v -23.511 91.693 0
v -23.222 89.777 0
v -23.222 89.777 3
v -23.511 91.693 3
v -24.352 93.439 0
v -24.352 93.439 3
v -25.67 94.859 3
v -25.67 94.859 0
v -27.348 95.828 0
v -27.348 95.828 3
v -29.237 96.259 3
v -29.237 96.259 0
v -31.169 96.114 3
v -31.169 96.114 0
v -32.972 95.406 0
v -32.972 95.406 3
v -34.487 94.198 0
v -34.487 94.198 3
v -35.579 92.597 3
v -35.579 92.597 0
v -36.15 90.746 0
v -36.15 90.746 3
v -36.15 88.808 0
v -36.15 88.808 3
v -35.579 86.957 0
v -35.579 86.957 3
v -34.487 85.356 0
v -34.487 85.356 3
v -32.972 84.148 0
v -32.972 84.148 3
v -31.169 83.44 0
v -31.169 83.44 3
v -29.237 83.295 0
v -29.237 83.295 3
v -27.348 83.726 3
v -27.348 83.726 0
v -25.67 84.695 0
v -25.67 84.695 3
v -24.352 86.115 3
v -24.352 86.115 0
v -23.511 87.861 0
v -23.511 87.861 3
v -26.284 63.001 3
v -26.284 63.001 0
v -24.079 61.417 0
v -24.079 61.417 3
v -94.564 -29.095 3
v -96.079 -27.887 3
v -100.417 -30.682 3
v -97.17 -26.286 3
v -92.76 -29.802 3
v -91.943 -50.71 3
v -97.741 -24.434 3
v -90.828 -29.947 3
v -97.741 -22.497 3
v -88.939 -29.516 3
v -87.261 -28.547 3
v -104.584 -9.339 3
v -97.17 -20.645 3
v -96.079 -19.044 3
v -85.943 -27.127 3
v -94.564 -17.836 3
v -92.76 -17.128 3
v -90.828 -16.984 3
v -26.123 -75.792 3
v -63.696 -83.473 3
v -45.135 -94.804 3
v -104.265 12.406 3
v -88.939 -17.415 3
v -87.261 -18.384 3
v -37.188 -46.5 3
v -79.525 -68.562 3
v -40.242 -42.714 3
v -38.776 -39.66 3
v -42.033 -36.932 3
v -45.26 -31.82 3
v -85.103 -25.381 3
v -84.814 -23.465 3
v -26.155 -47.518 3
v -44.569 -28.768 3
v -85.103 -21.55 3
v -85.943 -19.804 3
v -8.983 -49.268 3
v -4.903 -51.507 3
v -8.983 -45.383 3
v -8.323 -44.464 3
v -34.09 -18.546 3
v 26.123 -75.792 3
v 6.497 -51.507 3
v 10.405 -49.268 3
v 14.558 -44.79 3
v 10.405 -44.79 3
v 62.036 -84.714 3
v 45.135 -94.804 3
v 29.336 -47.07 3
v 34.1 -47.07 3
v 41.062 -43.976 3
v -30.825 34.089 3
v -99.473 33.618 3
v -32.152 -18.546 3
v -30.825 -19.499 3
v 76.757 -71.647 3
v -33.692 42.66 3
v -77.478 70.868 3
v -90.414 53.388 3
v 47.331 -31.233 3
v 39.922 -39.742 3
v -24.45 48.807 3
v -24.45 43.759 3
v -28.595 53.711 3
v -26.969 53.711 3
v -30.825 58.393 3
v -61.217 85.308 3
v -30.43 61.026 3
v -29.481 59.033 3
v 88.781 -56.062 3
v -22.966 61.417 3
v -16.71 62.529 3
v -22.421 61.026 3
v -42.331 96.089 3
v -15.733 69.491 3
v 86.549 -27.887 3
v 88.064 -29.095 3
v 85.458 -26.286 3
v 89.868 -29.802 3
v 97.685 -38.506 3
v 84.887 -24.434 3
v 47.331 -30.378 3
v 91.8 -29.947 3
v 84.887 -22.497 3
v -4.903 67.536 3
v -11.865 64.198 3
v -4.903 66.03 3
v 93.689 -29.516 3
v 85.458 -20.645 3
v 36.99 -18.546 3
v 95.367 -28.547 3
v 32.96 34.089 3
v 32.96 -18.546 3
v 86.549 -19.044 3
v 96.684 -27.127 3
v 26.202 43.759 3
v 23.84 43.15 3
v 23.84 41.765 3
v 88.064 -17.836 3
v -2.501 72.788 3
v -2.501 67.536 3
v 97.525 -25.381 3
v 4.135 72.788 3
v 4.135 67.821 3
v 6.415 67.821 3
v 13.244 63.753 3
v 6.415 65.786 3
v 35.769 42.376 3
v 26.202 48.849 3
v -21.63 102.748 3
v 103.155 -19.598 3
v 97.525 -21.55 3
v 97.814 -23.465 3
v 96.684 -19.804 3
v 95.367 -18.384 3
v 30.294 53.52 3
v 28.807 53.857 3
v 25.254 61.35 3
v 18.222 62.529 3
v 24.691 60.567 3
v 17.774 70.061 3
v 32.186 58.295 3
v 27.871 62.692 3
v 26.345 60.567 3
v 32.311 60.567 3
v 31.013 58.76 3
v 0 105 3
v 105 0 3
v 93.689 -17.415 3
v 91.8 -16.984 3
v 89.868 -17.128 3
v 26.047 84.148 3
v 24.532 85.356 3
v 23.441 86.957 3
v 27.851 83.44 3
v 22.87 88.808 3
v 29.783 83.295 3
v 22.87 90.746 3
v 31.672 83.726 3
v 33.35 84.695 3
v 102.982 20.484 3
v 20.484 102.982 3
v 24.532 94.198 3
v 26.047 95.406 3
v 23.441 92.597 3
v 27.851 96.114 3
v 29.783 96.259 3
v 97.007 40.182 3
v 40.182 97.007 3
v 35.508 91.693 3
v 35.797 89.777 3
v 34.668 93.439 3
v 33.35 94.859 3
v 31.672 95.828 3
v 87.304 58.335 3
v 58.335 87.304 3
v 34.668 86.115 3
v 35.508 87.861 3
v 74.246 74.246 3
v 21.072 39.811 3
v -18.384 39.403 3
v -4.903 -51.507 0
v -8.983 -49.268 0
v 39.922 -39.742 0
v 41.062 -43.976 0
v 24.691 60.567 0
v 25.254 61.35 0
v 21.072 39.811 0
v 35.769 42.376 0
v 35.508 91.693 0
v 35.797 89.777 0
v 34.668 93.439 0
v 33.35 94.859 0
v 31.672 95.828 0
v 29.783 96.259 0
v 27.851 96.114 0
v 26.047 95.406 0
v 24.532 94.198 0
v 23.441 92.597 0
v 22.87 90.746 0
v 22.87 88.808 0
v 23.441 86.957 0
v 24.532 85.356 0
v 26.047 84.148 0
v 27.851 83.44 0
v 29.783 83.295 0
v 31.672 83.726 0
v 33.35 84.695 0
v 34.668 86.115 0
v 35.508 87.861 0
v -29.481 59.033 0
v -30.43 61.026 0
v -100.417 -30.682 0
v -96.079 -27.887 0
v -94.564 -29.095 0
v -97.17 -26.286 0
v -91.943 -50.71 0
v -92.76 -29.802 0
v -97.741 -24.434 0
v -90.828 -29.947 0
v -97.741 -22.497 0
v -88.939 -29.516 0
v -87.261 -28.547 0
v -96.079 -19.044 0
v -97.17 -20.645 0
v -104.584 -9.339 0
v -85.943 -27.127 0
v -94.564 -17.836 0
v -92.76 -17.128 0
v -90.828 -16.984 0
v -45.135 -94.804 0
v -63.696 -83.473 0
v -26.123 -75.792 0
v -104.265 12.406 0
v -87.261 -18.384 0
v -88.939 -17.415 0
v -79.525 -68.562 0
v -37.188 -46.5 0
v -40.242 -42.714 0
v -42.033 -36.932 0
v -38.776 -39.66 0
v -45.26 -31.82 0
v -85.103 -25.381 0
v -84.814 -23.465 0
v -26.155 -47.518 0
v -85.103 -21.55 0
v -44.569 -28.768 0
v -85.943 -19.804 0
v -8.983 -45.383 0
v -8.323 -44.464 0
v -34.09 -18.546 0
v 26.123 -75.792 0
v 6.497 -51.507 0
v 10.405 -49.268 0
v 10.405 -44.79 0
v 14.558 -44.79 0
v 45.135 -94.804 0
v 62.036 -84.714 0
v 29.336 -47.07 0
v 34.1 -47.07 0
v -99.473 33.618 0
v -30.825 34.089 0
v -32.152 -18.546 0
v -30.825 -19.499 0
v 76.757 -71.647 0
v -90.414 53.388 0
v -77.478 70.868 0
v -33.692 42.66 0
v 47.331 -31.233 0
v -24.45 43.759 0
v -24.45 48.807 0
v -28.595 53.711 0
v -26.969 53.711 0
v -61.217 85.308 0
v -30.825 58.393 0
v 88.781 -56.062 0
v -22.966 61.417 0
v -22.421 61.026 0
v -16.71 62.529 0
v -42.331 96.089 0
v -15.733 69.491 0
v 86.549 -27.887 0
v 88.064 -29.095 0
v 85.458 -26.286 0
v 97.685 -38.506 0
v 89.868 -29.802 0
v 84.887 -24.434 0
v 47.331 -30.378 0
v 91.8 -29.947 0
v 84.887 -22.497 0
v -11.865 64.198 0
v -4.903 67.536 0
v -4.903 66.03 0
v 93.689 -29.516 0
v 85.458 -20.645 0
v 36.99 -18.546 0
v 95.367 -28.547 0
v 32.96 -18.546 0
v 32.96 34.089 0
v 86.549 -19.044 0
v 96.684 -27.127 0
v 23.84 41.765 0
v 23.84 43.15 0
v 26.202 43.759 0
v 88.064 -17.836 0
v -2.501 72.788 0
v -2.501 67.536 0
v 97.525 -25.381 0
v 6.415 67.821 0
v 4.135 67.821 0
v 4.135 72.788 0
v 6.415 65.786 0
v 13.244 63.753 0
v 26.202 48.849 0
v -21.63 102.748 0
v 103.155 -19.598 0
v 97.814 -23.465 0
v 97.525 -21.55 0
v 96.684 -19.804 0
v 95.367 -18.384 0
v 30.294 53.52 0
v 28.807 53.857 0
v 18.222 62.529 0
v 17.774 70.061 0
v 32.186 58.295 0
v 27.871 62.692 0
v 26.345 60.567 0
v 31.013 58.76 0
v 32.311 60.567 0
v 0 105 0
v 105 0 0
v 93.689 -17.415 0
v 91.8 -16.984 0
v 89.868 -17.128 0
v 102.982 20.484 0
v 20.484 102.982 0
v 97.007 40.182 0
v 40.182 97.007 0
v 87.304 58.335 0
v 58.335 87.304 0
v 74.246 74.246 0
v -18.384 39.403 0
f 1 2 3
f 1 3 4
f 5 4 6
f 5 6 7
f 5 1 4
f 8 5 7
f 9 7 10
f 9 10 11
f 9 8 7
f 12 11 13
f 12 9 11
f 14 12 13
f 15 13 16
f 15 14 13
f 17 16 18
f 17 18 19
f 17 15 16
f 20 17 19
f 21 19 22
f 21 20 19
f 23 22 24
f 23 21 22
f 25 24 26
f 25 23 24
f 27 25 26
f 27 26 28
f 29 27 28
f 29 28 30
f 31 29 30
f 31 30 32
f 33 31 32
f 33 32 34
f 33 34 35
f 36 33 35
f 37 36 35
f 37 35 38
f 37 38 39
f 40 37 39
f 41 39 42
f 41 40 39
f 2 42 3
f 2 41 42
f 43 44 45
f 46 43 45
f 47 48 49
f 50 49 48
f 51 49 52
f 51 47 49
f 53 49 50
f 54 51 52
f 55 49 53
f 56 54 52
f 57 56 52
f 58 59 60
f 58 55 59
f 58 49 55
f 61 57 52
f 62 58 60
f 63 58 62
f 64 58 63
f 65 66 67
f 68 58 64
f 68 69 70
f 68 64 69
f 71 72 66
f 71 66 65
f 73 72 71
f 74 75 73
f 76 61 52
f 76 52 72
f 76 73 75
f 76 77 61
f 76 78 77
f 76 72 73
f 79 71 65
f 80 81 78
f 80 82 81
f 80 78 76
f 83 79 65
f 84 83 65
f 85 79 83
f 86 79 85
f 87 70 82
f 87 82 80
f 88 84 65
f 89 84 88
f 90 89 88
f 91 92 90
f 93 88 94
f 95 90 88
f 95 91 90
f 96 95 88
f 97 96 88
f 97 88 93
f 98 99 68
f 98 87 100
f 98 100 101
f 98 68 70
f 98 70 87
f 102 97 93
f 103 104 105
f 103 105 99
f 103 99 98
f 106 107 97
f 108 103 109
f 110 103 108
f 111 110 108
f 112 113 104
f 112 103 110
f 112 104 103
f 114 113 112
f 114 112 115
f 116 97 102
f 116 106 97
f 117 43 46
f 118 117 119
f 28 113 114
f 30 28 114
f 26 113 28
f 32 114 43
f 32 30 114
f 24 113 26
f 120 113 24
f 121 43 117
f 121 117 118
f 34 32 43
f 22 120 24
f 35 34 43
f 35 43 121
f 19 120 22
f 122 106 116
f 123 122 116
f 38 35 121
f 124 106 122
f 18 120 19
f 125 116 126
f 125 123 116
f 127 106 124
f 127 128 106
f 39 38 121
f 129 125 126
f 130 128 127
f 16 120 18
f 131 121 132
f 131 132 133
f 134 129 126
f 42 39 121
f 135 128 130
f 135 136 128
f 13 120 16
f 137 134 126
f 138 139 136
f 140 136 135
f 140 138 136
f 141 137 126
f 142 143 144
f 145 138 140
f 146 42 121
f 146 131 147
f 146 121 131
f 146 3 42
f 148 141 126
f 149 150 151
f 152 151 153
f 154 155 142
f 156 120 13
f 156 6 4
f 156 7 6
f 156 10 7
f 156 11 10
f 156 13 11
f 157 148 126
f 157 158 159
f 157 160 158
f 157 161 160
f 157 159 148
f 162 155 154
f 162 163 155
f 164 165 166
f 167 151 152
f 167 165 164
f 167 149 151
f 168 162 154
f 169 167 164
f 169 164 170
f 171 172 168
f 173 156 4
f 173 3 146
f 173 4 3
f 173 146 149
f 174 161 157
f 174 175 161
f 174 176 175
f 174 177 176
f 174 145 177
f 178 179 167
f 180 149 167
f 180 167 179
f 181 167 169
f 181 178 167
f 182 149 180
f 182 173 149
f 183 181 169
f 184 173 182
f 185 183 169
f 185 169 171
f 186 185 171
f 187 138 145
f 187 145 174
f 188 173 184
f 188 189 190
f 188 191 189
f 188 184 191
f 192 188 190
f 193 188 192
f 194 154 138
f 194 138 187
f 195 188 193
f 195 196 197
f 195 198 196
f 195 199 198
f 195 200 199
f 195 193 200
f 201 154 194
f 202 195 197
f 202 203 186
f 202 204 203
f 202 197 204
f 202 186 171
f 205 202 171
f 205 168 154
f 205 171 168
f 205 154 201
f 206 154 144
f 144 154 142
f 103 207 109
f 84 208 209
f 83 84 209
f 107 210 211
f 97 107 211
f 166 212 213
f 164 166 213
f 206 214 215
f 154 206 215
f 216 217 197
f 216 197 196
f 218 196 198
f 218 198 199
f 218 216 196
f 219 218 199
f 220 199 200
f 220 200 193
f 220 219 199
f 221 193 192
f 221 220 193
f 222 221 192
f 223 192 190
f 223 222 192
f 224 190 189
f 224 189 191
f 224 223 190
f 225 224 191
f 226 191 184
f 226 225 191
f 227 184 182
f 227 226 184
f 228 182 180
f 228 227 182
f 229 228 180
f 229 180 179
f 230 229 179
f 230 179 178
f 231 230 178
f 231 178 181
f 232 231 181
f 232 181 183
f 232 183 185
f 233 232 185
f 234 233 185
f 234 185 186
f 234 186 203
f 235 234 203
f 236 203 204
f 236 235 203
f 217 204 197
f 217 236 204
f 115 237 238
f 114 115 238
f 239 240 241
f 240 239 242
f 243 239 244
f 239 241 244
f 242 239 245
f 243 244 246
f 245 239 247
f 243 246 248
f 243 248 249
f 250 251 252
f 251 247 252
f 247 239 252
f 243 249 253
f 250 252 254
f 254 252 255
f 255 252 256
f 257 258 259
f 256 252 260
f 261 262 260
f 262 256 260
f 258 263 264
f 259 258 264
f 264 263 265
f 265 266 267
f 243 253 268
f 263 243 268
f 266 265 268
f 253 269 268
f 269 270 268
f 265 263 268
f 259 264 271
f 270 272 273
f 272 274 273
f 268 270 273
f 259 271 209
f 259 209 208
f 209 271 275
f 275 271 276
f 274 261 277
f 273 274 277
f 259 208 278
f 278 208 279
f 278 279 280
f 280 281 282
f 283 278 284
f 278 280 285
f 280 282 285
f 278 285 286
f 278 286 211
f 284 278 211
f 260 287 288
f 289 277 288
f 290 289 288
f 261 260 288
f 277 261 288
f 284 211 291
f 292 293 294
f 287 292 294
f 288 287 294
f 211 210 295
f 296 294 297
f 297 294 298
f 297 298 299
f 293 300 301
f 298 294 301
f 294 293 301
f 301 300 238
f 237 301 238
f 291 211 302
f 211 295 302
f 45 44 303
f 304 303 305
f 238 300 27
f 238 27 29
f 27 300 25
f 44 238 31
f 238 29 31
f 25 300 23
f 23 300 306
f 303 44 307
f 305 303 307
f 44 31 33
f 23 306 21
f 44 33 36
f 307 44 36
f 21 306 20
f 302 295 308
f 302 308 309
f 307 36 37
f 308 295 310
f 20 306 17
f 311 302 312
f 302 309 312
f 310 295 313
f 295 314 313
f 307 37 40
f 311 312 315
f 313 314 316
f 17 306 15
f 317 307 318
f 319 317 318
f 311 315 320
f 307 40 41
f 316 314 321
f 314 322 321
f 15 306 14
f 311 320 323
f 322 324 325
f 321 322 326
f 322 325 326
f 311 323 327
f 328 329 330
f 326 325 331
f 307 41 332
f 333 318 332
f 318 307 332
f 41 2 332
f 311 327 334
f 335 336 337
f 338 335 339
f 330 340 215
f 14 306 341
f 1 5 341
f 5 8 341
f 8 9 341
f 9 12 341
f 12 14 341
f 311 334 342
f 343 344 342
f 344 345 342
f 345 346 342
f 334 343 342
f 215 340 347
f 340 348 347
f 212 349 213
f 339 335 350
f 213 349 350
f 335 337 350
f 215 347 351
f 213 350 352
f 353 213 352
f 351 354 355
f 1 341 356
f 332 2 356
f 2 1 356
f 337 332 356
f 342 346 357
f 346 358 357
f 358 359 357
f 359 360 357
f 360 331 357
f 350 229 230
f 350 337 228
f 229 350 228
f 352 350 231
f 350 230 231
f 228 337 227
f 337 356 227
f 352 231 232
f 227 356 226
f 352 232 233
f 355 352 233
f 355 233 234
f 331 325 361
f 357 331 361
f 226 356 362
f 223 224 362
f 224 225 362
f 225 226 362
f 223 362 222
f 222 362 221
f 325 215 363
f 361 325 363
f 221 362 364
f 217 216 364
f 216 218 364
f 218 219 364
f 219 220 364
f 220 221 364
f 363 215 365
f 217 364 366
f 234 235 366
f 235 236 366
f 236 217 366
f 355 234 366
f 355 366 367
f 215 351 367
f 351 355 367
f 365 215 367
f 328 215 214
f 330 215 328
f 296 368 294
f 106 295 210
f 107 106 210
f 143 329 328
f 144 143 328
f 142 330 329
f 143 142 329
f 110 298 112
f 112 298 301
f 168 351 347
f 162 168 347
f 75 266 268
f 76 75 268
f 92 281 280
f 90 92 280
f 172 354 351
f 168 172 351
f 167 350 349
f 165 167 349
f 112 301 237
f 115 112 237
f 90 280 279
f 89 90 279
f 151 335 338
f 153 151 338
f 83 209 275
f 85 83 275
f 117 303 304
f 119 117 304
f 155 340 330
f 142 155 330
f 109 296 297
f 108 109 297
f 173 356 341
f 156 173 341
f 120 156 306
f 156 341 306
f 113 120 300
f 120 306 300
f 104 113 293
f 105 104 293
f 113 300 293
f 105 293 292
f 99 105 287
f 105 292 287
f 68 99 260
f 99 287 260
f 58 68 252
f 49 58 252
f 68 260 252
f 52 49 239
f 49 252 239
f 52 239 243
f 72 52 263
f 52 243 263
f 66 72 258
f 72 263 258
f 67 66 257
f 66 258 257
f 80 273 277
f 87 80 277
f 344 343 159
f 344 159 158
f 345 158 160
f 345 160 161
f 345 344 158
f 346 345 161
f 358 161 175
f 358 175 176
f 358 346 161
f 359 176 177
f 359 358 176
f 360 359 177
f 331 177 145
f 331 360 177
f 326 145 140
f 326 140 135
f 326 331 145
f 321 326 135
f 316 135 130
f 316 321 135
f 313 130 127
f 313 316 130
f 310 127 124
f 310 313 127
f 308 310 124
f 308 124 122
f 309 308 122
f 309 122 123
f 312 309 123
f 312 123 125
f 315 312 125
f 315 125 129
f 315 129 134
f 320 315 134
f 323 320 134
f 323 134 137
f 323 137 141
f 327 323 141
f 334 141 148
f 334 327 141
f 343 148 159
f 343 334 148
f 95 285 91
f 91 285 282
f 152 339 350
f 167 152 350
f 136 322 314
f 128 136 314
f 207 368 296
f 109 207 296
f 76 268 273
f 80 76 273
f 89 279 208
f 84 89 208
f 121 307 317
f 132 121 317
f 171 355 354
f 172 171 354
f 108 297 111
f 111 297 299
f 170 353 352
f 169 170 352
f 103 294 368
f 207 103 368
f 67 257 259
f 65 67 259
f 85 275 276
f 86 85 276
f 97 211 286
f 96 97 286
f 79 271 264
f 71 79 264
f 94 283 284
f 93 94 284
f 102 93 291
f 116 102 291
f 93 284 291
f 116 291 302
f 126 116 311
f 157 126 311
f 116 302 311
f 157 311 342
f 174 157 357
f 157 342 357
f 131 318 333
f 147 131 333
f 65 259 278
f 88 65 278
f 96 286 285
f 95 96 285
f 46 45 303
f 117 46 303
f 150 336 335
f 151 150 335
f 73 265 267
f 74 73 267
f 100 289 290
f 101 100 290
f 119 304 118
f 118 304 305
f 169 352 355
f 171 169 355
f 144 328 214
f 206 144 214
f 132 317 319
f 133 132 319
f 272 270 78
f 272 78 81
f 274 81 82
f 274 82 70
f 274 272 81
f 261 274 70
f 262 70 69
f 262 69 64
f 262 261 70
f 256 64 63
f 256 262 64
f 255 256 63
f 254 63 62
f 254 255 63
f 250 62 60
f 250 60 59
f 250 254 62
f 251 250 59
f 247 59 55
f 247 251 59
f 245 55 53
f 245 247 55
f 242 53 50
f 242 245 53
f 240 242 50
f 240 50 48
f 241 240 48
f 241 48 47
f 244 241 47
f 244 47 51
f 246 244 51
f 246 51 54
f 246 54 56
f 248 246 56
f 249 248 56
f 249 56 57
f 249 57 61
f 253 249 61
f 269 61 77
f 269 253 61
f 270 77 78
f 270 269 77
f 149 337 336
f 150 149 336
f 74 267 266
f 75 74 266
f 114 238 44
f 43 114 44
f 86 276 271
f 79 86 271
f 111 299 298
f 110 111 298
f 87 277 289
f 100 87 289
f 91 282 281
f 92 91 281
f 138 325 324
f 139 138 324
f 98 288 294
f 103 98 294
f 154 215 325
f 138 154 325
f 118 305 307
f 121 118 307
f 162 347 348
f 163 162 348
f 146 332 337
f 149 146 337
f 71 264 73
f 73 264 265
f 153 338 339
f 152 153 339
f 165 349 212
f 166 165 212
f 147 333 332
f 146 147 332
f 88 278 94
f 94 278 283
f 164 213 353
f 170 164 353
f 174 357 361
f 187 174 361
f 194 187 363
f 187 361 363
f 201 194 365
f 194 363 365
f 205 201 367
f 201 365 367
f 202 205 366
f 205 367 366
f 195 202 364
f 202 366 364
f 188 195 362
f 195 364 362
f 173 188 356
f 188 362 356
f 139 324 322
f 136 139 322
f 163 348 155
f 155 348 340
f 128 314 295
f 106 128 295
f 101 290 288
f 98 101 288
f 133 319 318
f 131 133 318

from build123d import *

# Parameters (mm, degrees)
F0_R     = 6.5
F1_DEPTH = 3


with BuildPart() as f1:
    # F0 (on Top) → F1 (new body)
    with BuildSketch(Plane.XY):
        with BuildLine():
            Line((0, 72.78838), (0, 105))
            ThreePointArc((0, 105), (-102.419357, 23.136018), (-45.134783, -94.804279))
            Line((-45.134783, -94.804279), (-26.122815, -75.792312))
            Line((-26.122815, -75.792312), (0, -75.792312))
            Line((0, -75.792312), (0, -64.716025))
            Line((0, -64.716025), (0, -51.507495))
            Line((0, -51.507495), (-4.902991, -51.507495))
            Line((-4.902991, -51.507495), (-8.982703, -49.268302))
            Line((-8.982703, -49.268302), (-8.982703, -45.383053))
            Line((-8.982703, -45.383053), (-8.322856, -44.464201))
            Line((-8.322856, -44.464201), (-26.155021, -47.517654))
            Line((-26.155021, -47.517654), (-37.188161, -46.499837))
            Line((-37.188161, -46.499837), (-40.241614, -42.713556))
            Line((-40.241614, -42.713556), (-38.775958, -39.660104))
            Line((-38.775958, -39.660104), (-42.032976, -36.932353))
            Line((-42.032976, -36.932353), (-45.260154, -31.819914))
            Line((-45.260154, -31.819914), (-44.569235, -28.768361))
            Line((-44.569235, -28.768361), (-34.090322, -18.546099))
            Line((-34.090322, -18.546099), (-32.151641, -18.546099))
            Line((-32.151641, -18.546099), (-30.825328, -19.498551))
            Line((-30.825328, -19.498551), (-30.825328, 34.089174))
            Line((-30.825328, 34.089174), (-33.692077, 42.6598))
            Line((-33.692077, 42.6598), (-18.384103, 39.402783))
            Line((-18.384103, 39.402783), (-24.450295, 43.759041))
            Line((-24.450295, 43.759041), (-24.450295, 48.807416))
            Line((-24.450295, 48.807416), (-26.969282, 53.710941))
            Line((-26.969282, 53.710941), (-28.595109, 53.710941))
            Line((-28.595109, 53.710941), (-30.825328, 58.393094))
            Line((-30.825328, 58.393094), (-29.480881, 59.033486))
            Line((-29.480881, 59.033486), (-30.429862, 61.025791))
            Line((-30.429862, 61.025791), (-26.284034, 63.000545))
            Line((-26.284034, 63.000545), (-24.078682, 61.416837))
            Line((-24.078682, 61.416837), (-22.965606, 61.416837))
            Line((-22.965606, 61.416837), (-22.421065, 61.025791))
            Line((-22.421065, 61.025791), (-16.709682, 62.528782))
            Line((-16.709682, 62.528782), (-15.732577, 69.490649))
            Line((-15.732577, 69.490649), (-11.864871, 64.198002))
            Line((-11.864871, 64.198002), (-4.902991, 66.03007))
            Line((-4.902991, 66.03007), (-4.902991, 67.536443))
            Line((-4.902991, 67.536443), (-2.50095, 67.536443))
            Line((-2.50095, 67.536443), (-2.50095, 72.78838))
            Line((-2.50095, 72.78838), (0, 72.78838))
        make_face()
        with Locations((-91.313913, -23.465414)):
            Circle(F0_R, mode=Mode.SUBTRACT)
        with Locations((-29.72243, 89.777015)):
            Circle(F0_R, mode=Mode.SUBTRACT)
        with BuildLine():
            ThreePointArc((45.134783, -94.804279), (88.781057, -56.061787), (105, 0))
            ThreePointArc((105, 0), (74.246212, 74.246212), (0, 105))
            Line((0, 105), (0, 72.78838))
            Line((0, 72.78838), (4.135221, 72.78838))
            Line((4.135221, 72.78838), (4.135221, 67.821436))
            Line((4.135221, 67.821436), (6.415132, 67.821436))
            Line((6.415132, 67.821436), (6.415132, 65.785795))
            Line((6.415132, 65.785795), (13.244115, 63.752693))
            Line((13.244115, 63.752693), (17.773977, 70.060633))
            Line((17.773977, 70.060633), (18.221818, 62.528782))
            Line((18.221818, 62.528782), (24.691317, 60.566589))
            Line((24.691317, 60.566589), (25.253858, 61.34994))
            Line((25.253858, 61.34994), (26.344692, 60.566589))
            Line((26.344692, 60.566589), (27.870728, 62.691629))
            Line((27.870728, 62.691629), (32.310771, 60.566589))
            Line((32.310771, 60.566589), (31.013132, 58.759595))
            Line((31.013132, 58.759595), (32.186273, 58.294658))
            Line((32.186273, 58.294658), (30.294107, 53.5203))
            Line((30.294107, 53.5203), (28.80712, 53.856976))
            Line((28.80712, 53.856976), (26.201509, 48.849314))
            Line((26.201509, 48.849314), (26.201509, 43.759041))
            Line((26.201509, 43.759041), (23.840172, 43.149535))
            Line((23.840172, 43.149535), (23.840172, 41.765302))
            Line((23.840172, 41.765302), (21.07171, 39.811093))
            Line((21.07171, 39.811093), (35.768993, 42.375993))
            Line((35.768993, 42.375993), (32.959819, 34.089174))
            Line((32.959819, 34.089174), (32.959819, -17.675241))
            Line((32.959819, -17.675241), (32.959819, -18.546099))
            Line((32.959819, -18.546099), (36.990378, -18.546099))
            Line((36.990378, -18.546099), (47.331408, -30.377604))
            Line((47.331408, -30.377604), (47.331408, -31.232571))
            Line((47.331408, -31.232571), (39.921697, -39.741524))
            Line((39.921697, -39.741524), (41.061651, -43.975644))
            Line((41.061651, -43.975644), (34.09978, -47.06981))
            Line((34.09978, -47.06981), (29.336393, -47.06981))
            Line((29.336393, -47.06981), (14.557681, -44.789899))
            Line((14.557681, -44.789899), (10.404986, -44.789899))
            Line((10.404986, -44.789899), (10.404986, -49.268302))
            Line((10.404986, -49.268302), (6.496566, -51.507495))
            Line((6.496566, -51.507495), (0, -51.507495))
            Line((0, -51.507495), (0, -64.716025))
            Line((0, -64.716025), (0, -75.792312))
            Line((0, -75.792312), (26.122815, -75.792312))
            Line((26.122815, -75.792312), (45.134783, -94.804279))
        make_face()
        with Locations((91.313914, -23.465414)):
            Circle(F0_R, mode=Mode.SUBTRACT)
        with Locations((29.297218, 89.777015)):
            Circle(F0_R, mode=Mode.SUBTRACT)
    extrude(amount=F1_DEPTH)


solid = f1.part
